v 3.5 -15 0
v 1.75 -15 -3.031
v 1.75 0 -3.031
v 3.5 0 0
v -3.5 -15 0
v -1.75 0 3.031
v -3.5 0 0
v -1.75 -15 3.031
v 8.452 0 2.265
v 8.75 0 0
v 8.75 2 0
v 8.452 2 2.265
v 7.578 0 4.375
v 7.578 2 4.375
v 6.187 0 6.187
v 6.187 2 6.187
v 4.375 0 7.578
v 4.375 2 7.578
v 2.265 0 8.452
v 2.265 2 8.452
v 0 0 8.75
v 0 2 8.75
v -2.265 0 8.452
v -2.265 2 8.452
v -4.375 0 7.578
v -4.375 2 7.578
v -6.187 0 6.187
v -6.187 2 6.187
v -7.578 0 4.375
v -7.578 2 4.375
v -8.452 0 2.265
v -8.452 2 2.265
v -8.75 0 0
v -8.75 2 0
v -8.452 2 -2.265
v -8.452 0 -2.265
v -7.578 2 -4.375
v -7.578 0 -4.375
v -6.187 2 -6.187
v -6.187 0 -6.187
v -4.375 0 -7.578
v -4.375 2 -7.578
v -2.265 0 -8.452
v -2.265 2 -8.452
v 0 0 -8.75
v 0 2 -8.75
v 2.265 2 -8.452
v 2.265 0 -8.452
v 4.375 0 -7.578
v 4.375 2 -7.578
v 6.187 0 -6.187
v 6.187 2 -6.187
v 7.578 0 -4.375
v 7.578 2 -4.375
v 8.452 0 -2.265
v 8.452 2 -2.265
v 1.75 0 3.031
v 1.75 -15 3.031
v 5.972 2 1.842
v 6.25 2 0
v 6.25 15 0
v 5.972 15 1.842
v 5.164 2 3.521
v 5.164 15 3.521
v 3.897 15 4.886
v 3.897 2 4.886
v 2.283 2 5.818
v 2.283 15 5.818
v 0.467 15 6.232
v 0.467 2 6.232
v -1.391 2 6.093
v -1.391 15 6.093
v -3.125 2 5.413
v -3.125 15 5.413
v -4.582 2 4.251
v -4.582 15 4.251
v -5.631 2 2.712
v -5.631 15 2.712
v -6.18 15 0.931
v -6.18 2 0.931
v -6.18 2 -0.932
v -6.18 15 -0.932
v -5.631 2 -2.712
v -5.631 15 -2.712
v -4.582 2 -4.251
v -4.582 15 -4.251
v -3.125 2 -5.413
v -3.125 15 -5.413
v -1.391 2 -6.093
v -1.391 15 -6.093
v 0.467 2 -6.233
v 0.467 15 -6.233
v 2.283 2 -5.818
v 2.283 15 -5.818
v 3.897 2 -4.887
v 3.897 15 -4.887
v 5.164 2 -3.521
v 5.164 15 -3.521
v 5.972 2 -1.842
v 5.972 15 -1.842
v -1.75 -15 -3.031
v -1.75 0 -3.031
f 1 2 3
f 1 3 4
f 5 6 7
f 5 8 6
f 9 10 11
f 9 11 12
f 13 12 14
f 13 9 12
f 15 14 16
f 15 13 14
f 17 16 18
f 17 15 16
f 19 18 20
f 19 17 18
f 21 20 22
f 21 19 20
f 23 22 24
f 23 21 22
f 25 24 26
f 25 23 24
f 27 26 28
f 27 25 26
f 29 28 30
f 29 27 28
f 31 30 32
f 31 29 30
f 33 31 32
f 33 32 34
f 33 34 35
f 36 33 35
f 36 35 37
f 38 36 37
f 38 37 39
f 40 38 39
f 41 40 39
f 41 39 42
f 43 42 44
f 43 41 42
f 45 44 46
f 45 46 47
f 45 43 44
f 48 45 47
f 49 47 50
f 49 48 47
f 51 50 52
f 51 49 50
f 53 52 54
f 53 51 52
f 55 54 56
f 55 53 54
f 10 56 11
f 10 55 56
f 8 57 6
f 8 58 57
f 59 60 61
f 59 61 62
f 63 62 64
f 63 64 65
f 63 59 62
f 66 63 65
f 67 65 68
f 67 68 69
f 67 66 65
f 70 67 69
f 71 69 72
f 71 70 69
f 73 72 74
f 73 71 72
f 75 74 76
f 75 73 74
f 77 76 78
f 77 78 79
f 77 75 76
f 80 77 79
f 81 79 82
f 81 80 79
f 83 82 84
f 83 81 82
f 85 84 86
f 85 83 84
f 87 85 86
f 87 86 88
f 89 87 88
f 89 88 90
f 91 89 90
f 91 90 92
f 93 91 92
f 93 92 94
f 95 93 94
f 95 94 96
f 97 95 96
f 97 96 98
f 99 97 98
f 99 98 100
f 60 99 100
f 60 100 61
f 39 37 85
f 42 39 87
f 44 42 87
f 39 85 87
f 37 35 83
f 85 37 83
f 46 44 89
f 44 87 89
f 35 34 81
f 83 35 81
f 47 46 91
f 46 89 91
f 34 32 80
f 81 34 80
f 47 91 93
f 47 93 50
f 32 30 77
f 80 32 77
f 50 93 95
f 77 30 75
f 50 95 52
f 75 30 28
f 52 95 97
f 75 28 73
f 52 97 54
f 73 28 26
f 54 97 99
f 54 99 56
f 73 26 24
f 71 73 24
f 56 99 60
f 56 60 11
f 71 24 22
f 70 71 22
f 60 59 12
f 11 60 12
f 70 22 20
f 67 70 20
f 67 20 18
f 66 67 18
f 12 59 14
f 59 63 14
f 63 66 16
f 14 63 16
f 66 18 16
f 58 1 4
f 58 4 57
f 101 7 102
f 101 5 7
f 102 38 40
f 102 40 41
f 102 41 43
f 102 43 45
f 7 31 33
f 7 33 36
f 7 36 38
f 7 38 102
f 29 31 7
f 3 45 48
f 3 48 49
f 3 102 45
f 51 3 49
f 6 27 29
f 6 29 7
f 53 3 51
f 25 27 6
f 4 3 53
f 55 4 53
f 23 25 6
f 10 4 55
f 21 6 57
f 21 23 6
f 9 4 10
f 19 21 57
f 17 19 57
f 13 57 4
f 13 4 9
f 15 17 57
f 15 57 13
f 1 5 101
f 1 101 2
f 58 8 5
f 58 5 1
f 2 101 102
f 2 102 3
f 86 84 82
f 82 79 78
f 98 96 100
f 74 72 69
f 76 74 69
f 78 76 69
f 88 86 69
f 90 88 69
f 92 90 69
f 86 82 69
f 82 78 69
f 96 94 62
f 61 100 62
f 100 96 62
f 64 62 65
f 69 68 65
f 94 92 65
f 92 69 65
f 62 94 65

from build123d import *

# Parameters (mm, degrees)
F0_R     = 8.75
F0_R_2   = 6.25
F1_DEPTH = 2
F2_DEPTH = 15
F3_DEPTH = 15


with BuildPart() as f1:
    # F0 (on Front) → F1 (new body)
    with BuildSketch(Plane.XZ):
        with Locations((0, -6.7e-05)):
            Circle(F0_R)
        with Locations((0, -6.7e-05)):
            Circle(F0_R_2, mode=Mode.SUBTRACT)
    extrude(amount=-F1_DEPTH)

    # F0 (on Front) → F2 (join)
    with BuildSketch(Plane.XZ):
        with Locations((0, -6.7e-05)):
            Circle(F0_R_2)
        Polygon((1.75, -3.031089), (-1.75, -3.031089), (-3.5, 0), (-1.75, 3.031089), (1.75, 3.031089), (3.5, 0), align=None, mode=Mode.SUBTRACT)
    extrude(amount=-F2_DEPTH)

    # F0 (on Front) → F3 (join, symmetric)
    with BuildSketch(Plane.XZ):
        Polygon((-3.5, 0), (-1.75, -3.031089), (1.75, -3.031089), (3.5, 0), (1.75, 3.031089), (-1.75, 3.031089), align=None)
    extrude(amount=F3_DEPTH, both=True)


solid = f1.part
